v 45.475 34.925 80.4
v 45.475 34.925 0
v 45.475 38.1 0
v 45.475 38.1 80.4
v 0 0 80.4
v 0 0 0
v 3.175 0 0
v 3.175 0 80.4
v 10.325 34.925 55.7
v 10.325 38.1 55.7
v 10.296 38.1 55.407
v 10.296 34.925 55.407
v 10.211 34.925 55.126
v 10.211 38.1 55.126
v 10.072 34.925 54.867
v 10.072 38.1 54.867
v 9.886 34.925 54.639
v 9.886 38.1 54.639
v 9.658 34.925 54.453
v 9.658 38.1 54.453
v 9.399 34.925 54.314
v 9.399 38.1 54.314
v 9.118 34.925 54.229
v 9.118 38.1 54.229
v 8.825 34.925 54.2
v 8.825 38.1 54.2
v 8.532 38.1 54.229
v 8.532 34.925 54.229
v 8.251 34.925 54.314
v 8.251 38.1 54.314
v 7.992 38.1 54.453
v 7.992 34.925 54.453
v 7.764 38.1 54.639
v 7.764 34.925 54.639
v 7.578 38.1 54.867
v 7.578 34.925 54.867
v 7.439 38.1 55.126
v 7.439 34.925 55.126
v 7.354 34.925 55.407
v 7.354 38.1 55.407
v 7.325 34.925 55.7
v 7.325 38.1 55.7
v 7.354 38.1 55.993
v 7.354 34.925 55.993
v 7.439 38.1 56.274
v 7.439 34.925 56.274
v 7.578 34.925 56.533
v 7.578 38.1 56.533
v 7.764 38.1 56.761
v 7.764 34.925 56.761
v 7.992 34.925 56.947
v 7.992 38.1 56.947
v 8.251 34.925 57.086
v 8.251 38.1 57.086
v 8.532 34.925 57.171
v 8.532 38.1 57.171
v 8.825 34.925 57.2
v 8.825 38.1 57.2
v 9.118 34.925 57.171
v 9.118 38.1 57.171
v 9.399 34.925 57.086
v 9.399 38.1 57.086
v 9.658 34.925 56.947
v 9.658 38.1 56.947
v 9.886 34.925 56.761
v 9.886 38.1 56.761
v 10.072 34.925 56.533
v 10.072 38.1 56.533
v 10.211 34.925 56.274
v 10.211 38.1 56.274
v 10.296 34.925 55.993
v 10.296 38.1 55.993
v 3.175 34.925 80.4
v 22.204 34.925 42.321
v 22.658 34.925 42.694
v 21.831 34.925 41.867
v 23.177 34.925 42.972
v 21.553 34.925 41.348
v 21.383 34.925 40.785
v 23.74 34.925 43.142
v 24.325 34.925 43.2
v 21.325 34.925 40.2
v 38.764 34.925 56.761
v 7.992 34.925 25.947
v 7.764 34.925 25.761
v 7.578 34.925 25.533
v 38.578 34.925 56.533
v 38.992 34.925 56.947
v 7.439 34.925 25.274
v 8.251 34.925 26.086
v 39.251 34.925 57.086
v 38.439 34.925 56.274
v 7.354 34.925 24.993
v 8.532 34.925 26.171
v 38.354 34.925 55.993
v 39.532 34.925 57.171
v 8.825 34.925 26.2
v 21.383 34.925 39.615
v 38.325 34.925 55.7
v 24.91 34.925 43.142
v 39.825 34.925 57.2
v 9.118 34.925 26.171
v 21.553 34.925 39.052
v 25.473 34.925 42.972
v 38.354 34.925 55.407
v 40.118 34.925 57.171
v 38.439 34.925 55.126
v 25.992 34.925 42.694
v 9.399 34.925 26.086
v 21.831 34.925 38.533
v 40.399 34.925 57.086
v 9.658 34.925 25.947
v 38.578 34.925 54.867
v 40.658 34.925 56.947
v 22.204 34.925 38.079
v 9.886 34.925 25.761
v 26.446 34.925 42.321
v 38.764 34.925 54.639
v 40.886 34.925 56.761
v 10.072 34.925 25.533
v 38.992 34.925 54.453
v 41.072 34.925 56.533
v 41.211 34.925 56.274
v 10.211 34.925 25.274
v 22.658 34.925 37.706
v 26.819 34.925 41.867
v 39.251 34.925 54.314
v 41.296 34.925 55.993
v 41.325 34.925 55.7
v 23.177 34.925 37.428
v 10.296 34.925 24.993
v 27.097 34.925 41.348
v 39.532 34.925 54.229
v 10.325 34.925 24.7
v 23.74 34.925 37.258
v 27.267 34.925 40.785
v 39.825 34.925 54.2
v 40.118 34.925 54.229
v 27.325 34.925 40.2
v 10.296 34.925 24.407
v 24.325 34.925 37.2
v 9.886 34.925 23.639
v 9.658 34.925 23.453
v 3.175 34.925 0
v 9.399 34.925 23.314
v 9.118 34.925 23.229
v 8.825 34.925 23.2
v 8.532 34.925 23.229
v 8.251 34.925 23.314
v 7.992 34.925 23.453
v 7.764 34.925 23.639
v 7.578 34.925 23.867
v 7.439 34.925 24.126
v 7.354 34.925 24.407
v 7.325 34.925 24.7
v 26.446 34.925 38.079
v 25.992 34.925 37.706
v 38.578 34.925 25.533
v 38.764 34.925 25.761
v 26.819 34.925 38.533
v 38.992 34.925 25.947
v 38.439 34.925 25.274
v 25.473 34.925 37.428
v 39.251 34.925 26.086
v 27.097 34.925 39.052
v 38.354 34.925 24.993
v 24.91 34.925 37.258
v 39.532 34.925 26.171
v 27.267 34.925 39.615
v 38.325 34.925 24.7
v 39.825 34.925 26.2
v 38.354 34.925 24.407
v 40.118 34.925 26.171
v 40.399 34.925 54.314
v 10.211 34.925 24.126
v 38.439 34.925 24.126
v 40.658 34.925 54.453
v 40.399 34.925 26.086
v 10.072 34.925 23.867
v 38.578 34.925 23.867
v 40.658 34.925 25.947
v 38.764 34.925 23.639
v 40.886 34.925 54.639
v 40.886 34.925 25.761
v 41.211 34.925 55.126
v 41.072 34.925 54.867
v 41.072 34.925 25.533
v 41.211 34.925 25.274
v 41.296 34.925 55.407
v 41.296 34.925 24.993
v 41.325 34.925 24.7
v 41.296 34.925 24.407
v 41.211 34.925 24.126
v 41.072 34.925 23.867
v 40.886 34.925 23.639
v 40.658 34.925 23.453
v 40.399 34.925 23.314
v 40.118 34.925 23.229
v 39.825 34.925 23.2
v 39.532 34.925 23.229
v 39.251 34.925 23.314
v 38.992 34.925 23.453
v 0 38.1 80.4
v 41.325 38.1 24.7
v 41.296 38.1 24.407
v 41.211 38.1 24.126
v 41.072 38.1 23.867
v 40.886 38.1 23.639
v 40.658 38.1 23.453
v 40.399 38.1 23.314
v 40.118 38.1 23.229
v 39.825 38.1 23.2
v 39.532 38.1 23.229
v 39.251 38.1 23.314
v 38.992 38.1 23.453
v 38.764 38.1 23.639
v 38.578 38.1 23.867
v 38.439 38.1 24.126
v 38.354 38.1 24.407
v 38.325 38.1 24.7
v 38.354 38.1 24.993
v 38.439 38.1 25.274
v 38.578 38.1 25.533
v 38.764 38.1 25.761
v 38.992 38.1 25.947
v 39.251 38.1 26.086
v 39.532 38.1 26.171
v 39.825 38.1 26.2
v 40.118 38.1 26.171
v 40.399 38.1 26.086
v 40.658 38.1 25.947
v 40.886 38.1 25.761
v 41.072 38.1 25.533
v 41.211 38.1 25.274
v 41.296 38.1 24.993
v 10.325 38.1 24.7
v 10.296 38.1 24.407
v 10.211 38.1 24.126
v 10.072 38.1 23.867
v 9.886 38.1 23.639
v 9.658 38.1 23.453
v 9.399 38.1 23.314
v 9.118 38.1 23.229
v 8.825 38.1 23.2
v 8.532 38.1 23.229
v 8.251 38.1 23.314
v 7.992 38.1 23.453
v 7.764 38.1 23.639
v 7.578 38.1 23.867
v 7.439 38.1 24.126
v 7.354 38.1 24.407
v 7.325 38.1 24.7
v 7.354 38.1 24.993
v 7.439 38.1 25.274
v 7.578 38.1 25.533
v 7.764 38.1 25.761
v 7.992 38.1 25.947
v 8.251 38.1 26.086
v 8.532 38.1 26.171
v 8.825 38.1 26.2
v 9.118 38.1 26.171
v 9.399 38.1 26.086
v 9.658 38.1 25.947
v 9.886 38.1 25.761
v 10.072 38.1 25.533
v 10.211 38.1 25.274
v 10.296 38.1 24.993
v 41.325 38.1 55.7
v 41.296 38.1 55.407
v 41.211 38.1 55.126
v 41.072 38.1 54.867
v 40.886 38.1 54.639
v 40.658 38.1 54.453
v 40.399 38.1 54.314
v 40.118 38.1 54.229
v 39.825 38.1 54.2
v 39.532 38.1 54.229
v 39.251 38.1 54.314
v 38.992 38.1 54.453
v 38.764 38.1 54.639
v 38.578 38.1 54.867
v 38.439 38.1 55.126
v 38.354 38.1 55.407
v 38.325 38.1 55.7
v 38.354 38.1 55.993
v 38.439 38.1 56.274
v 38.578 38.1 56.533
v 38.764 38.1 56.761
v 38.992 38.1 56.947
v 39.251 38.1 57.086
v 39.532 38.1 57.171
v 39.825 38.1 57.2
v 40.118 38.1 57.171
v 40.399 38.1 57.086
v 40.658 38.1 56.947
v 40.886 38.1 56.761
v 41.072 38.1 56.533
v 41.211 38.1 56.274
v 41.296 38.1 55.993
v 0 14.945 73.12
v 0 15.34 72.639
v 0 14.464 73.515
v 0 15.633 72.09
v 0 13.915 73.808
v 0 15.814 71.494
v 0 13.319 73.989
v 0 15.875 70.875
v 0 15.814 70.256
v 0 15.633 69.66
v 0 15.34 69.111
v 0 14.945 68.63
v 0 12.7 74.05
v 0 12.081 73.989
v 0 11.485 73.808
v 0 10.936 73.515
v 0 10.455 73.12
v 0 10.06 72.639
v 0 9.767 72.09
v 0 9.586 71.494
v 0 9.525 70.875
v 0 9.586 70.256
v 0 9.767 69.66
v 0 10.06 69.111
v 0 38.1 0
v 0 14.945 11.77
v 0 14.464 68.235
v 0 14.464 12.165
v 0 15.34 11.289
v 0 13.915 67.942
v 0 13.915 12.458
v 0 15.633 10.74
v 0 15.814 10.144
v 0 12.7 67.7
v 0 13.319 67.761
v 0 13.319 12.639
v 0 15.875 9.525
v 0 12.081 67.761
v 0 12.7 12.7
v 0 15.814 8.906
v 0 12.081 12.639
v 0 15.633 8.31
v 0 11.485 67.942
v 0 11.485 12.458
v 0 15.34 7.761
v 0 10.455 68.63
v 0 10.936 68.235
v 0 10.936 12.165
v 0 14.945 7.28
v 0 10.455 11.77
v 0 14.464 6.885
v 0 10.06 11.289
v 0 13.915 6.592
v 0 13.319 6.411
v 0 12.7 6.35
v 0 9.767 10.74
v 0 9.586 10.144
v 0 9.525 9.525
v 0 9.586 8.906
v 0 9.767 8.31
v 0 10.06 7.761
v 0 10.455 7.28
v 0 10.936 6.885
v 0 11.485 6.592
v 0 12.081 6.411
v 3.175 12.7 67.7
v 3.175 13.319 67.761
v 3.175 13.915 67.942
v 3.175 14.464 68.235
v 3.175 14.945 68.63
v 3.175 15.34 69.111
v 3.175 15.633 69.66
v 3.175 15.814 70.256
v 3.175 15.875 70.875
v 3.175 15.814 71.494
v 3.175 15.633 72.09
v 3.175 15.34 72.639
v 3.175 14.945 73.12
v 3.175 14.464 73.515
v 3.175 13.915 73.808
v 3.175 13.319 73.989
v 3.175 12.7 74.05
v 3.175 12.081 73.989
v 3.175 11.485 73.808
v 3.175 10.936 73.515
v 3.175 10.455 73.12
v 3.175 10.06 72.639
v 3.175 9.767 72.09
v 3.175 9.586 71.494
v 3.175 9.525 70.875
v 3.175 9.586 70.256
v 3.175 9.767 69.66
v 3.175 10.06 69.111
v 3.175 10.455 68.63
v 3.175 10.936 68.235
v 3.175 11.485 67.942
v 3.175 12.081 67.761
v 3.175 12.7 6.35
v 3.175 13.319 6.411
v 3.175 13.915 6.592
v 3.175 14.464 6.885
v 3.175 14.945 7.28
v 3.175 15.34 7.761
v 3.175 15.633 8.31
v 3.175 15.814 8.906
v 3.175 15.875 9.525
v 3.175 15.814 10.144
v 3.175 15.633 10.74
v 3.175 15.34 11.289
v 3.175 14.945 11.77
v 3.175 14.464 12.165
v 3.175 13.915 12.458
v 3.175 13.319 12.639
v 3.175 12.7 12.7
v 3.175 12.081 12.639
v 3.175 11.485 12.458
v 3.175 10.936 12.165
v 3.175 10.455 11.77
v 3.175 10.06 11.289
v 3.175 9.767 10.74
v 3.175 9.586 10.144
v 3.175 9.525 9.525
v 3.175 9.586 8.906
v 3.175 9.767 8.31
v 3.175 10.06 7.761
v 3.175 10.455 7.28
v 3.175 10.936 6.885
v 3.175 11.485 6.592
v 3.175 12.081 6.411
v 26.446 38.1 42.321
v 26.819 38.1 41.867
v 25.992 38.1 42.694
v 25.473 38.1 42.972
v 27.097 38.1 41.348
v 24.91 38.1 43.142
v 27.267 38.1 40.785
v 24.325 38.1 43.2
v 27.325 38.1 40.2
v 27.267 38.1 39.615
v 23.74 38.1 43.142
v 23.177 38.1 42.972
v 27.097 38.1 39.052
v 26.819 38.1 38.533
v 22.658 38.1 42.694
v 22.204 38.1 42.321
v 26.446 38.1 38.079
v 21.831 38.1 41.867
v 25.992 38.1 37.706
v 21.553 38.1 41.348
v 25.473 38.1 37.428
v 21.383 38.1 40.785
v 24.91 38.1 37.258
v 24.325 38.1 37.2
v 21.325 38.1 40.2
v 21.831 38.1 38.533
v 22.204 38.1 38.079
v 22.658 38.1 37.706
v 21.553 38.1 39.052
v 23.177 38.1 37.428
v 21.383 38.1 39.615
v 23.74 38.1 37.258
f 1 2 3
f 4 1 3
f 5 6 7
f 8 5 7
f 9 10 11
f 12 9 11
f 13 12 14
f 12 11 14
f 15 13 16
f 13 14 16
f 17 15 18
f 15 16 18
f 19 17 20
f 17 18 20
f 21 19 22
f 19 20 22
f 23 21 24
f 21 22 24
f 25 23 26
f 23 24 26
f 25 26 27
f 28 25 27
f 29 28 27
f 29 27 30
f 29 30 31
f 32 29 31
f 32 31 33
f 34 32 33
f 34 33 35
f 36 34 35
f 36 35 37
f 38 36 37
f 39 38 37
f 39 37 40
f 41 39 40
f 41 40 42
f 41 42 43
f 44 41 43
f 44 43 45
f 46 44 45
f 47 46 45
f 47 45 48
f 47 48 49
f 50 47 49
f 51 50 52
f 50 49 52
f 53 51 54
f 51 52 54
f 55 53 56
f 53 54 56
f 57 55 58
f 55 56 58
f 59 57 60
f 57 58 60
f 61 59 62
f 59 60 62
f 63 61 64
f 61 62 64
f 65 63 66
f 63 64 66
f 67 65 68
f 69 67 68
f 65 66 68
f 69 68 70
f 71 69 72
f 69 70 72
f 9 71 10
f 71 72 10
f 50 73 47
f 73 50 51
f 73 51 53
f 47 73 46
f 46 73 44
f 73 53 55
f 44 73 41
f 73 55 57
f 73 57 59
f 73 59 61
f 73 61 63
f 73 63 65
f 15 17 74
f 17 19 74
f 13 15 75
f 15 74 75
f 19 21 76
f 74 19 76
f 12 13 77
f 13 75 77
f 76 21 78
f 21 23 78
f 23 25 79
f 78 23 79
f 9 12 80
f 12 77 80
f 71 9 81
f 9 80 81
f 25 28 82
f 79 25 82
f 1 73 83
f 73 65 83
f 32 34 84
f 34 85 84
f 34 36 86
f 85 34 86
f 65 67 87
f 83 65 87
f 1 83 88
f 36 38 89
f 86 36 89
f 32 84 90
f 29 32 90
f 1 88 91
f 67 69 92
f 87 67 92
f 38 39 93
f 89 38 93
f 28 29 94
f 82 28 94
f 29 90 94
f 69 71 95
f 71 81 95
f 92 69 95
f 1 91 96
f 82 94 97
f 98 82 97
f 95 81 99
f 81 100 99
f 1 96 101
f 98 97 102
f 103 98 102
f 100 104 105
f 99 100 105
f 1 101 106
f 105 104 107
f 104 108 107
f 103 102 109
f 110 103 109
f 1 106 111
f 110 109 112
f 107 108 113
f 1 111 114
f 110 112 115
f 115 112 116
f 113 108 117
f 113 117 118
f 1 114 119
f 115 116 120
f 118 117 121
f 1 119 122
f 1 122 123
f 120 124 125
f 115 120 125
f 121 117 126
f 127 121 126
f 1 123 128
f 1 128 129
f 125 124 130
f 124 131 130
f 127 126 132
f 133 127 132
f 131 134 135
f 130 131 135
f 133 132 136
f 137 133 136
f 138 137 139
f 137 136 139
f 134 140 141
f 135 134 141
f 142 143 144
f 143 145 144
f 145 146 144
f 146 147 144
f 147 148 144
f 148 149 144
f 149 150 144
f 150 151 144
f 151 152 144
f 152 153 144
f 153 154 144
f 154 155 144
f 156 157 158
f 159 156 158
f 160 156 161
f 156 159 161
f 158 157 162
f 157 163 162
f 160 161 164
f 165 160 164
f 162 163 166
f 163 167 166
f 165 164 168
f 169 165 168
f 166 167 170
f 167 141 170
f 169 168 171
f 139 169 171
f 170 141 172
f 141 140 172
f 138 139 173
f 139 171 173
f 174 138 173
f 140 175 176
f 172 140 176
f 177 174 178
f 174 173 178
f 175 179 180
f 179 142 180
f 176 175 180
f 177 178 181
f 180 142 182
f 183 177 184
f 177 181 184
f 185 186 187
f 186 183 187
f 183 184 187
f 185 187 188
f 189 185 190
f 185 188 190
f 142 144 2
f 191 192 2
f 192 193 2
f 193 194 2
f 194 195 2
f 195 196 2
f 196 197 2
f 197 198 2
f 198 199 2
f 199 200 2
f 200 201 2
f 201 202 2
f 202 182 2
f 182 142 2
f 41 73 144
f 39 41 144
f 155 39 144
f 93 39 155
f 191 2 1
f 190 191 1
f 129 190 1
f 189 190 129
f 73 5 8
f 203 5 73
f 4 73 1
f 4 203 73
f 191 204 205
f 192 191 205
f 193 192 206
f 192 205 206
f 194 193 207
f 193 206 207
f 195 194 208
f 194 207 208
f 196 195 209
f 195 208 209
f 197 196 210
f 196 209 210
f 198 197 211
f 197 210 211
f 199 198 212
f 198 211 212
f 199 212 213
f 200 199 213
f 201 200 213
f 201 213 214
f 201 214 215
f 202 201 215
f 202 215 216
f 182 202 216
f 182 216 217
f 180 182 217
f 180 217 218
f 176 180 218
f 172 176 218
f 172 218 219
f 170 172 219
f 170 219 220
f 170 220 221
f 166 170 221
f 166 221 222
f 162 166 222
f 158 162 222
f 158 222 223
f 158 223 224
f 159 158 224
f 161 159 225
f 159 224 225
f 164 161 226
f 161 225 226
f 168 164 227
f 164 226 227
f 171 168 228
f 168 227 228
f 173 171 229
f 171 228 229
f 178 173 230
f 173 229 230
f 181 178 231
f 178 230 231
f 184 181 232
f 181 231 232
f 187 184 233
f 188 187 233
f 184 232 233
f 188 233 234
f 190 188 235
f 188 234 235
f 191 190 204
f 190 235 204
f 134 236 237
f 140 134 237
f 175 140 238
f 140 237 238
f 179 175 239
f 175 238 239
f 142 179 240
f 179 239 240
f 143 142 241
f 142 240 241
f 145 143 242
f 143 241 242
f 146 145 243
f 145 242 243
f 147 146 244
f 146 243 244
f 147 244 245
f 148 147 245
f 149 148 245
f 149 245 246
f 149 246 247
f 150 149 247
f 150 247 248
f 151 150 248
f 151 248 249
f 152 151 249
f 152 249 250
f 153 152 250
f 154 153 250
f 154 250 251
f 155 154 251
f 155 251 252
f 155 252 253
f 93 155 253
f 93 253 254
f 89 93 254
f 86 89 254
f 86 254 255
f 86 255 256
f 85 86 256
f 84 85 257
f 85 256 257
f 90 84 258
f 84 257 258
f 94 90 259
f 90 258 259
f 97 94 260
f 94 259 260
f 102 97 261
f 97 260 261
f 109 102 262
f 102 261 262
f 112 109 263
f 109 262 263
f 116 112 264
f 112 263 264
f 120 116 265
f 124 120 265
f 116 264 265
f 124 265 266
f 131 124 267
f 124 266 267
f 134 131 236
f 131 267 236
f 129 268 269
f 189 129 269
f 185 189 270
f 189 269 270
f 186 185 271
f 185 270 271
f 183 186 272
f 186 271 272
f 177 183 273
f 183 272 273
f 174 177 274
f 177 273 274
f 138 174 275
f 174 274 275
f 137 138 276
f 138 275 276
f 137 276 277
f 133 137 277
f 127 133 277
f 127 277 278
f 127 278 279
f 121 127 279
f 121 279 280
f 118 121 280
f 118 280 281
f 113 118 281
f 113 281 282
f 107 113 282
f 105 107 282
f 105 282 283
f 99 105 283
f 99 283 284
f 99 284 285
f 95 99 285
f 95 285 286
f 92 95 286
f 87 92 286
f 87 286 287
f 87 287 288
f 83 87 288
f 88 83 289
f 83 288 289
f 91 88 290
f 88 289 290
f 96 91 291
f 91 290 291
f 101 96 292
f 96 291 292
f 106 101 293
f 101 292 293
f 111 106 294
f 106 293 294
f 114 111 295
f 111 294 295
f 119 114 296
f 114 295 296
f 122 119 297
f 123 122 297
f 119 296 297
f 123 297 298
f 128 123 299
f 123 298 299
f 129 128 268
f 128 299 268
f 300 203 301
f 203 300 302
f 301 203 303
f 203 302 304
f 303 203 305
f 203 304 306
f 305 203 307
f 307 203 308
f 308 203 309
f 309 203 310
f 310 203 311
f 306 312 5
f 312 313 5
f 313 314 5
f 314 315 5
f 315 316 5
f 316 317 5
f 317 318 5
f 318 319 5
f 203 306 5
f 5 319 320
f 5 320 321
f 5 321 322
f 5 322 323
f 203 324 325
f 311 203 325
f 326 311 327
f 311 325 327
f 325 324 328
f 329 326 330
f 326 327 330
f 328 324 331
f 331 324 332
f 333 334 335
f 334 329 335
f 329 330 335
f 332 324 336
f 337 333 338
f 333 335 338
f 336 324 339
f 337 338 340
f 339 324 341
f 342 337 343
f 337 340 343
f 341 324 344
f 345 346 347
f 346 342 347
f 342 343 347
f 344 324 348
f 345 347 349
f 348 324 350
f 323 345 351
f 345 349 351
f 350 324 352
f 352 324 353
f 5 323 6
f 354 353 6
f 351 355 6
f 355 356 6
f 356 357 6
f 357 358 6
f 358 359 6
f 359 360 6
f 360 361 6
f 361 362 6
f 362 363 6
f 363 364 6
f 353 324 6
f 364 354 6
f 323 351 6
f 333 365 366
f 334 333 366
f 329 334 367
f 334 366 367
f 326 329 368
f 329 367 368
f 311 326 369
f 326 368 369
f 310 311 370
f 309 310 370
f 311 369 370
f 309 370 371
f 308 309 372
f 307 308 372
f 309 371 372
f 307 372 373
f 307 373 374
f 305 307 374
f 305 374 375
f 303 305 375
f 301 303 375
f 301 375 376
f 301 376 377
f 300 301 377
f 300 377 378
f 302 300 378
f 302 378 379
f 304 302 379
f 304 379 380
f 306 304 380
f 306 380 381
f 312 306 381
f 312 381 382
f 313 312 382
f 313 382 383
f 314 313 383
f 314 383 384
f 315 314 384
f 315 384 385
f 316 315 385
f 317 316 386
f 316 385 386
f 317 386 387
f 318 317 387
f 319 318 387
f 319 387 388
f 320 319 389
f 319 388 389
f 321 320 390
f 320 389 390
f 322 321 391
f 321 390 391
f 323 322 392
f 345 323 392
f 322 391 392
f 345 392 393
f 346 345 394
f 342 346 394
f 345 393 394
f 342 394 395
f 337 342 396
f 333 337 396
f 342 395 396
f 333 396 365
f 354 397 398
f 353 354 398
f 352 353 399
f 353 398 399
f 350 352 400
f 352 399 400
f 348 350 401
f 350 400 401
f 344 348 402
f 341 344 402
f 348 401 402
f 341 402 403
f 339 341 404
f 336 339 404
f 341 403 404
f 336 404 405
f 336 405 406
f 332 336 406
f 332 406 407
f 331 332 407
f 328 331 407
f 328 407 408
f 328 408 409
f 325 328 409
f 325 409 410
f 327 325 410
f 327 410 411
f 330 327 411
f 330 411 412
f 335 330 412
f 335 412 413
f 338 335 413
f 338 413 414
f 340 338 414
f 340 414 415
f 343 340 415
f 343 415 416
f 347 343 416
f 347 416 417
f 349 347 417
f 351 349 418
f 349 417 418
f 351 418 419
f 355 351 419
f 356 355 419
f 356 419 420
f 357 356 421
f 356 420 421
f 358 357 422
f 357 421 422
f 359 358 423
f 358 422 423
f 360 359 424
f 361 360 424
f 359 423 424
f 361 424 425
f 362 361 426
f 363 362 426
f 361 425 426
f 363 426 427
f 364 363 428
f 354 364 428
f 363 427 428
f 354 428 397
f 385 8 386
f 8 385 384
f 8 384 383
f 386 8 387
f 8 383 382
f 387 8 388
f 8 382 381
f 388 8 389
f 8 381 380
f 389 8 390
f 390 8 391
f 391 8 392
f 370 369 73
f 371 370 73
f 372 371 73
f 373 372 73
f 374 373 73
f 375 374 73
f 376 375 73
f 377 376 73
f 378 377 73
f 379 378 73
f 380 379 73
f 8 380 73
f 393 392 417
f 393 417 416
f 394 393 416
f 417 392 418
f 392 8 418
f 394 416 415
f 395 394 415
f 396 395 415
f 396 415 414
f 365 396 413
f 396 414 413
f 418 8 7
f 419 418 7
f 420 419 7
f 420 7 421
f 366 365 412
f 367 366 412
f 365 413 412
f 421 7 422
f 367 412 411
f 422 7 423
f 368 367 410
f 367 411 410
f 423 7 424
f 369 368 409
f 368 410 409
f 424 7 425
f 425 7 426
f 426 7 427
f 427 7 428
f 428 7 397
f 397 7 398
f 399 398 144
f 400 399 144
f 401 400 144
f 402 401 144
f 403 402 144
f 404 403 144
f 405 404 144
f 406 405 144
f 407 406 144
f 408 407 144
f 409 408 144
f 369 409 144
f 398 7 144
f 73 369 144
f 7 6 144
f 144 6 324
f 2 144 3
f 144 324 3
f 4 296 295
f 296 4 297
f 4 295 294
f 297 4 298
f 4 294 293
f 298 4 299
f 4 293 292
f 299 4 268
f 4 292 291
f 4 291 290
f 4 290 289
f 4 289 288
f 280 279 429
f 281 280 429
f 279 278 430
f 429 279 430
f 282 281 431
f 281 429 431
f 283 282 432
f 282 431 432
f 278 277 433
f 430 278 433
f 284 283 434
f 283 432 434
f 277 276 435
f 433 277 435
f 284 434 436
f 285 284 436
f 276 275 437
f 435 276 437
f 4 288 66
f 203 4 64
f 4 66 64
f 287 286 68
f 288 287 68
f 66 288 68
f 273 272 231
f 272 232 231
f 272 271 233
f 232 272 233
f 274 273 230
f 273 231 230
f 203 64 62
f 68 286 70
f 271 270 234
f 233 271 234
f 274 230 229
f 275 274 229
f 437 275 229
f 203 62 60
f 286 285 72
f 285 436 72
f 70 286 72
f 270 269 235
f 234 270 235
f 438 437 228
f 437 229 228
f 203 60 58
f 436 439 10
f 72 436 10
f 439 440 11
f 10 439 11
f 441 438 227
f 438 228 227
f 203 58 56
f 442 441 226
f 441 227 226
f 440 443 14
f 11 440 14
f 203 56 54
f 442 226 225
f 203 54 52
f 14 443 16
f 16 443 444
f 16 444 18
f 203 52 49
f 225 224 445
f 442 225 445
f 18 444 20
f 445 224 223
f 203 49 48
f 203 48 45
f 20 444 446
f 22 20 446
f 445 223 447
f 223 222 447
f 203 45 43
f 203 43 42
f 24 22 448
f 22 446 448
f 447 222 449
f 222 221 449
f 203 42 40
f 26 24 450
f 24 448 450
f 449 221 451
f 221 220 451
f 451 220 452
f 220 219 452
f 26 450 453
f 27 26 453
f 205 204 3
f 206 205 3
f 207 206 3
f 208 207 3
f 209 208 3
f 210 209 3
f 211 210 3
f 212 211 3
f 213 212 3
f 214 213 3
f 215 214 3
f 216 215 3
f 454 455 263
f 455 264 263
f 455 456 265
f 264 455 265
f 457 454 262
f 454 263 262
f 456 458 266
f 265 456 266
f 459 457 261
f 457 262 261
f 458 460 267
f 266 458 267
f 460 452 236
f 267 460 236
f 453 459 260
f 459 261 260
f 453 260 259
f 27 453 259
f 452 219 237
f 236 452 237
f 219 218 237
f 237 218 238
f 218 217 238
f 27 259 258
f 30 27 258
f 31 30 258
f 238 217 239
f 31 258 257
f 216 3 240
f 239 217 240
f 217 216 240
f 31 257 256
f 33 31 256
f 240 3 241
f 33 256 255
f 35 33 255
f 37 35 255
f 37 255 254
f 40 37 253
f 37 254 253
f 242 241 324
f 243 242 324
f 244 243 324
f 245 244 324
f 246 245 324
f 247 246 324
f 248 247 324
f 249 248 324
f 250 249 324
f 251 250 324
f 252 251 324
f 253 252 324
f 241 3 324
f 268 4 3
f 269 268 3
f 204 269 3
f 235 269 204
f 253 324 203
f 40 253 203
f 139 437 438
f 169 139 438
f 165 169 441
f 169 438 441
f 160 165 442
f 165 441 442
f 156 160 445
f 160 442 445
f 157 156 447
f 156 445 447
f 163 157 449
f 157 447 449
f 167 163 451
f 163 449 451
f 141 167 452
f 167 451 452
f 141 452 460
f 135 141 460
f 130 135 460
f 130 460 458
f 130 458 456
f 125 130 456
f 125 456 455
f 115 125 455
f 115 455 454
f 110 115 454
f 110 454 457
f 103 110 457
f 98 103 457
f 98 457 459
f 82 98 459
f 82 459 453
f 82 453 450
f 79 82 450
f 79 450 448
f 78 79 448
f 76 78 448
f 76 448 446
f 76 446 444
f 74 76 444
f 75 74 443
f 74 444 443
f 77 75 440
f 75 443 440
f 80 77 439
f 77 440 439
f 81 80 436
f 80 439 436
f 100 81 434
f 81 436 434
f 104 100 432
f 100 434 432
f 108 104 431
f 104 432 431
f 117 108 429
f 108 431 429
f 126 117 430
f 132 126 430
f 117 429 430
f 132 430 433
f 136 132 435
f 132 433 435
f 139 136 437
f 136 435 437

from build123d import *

# Parameters (mm, degrees)
BOSS_EXTRUDE1_DEPTH = 80.4
SKETCH2_R           = 3.175
CUT_EXTRUDE1_DEPTH  = 4.175
SKETCH3_R           = 1.5
SKETCH3_R_2         = 3
CUT_EXTRUDE2_DEPTH  = 39.1


with BuildPart() as part:
    # Sketch1 → Boss-Extrude1 (new body)
    with BuildSketch(Plane.XY):
        Polygon((0, 0), (3.175, 0), (3.175, 34.925), (45.475, 34.925), (45.475, 38.1), (0, 38.1), align=None)
    extrude(amount=BOSS_EXTRUDE1_DEPTH)

    # Sketch2 → Cut-Extrude1 (cut, through all)
    with BuildSketch(Plane(origin=(3.175, 0, 0), x_dir=(0, 0, -1), z_dir=(1, 0, 0))):
        with Locations((-70.875, 12.7)):
            Circle(SKETCH2_R)
        with Locations((-9.525, 12.7)):
            Circle(SKETCH2_R)
    extrude(amount=-CUT_EXTRUDE1_DEPTH, mode=Mode.SUBTRACT)

    # Sketch3 → Cut-Extrude2 (cut, through all)
    with BuildSketch(Plane(origin=(0, 38.1, 0), x_dir=(1, 0, 0), z_dir=(0, 1, 0))):
        with Locations((39.825, -55.7)):
            Circle(SKETCH3_R)
        with Locations((8.825, -55.7)):
            Circle(SKETCH3_R)
        with Locations((8.825, -24.7)):
            Circle(SKETCH3_R)
        with Locations((39.825, -24.7)):
            Circle(SKETCH3_R)
        with Locations((24.325, -40.2)):
            Circle(SKETCH3_R_2)
    extrude(amount=-CUT_EXTRUDE2_DEPTH, mode=Mode.SUBTRACT)


solid = part.part
